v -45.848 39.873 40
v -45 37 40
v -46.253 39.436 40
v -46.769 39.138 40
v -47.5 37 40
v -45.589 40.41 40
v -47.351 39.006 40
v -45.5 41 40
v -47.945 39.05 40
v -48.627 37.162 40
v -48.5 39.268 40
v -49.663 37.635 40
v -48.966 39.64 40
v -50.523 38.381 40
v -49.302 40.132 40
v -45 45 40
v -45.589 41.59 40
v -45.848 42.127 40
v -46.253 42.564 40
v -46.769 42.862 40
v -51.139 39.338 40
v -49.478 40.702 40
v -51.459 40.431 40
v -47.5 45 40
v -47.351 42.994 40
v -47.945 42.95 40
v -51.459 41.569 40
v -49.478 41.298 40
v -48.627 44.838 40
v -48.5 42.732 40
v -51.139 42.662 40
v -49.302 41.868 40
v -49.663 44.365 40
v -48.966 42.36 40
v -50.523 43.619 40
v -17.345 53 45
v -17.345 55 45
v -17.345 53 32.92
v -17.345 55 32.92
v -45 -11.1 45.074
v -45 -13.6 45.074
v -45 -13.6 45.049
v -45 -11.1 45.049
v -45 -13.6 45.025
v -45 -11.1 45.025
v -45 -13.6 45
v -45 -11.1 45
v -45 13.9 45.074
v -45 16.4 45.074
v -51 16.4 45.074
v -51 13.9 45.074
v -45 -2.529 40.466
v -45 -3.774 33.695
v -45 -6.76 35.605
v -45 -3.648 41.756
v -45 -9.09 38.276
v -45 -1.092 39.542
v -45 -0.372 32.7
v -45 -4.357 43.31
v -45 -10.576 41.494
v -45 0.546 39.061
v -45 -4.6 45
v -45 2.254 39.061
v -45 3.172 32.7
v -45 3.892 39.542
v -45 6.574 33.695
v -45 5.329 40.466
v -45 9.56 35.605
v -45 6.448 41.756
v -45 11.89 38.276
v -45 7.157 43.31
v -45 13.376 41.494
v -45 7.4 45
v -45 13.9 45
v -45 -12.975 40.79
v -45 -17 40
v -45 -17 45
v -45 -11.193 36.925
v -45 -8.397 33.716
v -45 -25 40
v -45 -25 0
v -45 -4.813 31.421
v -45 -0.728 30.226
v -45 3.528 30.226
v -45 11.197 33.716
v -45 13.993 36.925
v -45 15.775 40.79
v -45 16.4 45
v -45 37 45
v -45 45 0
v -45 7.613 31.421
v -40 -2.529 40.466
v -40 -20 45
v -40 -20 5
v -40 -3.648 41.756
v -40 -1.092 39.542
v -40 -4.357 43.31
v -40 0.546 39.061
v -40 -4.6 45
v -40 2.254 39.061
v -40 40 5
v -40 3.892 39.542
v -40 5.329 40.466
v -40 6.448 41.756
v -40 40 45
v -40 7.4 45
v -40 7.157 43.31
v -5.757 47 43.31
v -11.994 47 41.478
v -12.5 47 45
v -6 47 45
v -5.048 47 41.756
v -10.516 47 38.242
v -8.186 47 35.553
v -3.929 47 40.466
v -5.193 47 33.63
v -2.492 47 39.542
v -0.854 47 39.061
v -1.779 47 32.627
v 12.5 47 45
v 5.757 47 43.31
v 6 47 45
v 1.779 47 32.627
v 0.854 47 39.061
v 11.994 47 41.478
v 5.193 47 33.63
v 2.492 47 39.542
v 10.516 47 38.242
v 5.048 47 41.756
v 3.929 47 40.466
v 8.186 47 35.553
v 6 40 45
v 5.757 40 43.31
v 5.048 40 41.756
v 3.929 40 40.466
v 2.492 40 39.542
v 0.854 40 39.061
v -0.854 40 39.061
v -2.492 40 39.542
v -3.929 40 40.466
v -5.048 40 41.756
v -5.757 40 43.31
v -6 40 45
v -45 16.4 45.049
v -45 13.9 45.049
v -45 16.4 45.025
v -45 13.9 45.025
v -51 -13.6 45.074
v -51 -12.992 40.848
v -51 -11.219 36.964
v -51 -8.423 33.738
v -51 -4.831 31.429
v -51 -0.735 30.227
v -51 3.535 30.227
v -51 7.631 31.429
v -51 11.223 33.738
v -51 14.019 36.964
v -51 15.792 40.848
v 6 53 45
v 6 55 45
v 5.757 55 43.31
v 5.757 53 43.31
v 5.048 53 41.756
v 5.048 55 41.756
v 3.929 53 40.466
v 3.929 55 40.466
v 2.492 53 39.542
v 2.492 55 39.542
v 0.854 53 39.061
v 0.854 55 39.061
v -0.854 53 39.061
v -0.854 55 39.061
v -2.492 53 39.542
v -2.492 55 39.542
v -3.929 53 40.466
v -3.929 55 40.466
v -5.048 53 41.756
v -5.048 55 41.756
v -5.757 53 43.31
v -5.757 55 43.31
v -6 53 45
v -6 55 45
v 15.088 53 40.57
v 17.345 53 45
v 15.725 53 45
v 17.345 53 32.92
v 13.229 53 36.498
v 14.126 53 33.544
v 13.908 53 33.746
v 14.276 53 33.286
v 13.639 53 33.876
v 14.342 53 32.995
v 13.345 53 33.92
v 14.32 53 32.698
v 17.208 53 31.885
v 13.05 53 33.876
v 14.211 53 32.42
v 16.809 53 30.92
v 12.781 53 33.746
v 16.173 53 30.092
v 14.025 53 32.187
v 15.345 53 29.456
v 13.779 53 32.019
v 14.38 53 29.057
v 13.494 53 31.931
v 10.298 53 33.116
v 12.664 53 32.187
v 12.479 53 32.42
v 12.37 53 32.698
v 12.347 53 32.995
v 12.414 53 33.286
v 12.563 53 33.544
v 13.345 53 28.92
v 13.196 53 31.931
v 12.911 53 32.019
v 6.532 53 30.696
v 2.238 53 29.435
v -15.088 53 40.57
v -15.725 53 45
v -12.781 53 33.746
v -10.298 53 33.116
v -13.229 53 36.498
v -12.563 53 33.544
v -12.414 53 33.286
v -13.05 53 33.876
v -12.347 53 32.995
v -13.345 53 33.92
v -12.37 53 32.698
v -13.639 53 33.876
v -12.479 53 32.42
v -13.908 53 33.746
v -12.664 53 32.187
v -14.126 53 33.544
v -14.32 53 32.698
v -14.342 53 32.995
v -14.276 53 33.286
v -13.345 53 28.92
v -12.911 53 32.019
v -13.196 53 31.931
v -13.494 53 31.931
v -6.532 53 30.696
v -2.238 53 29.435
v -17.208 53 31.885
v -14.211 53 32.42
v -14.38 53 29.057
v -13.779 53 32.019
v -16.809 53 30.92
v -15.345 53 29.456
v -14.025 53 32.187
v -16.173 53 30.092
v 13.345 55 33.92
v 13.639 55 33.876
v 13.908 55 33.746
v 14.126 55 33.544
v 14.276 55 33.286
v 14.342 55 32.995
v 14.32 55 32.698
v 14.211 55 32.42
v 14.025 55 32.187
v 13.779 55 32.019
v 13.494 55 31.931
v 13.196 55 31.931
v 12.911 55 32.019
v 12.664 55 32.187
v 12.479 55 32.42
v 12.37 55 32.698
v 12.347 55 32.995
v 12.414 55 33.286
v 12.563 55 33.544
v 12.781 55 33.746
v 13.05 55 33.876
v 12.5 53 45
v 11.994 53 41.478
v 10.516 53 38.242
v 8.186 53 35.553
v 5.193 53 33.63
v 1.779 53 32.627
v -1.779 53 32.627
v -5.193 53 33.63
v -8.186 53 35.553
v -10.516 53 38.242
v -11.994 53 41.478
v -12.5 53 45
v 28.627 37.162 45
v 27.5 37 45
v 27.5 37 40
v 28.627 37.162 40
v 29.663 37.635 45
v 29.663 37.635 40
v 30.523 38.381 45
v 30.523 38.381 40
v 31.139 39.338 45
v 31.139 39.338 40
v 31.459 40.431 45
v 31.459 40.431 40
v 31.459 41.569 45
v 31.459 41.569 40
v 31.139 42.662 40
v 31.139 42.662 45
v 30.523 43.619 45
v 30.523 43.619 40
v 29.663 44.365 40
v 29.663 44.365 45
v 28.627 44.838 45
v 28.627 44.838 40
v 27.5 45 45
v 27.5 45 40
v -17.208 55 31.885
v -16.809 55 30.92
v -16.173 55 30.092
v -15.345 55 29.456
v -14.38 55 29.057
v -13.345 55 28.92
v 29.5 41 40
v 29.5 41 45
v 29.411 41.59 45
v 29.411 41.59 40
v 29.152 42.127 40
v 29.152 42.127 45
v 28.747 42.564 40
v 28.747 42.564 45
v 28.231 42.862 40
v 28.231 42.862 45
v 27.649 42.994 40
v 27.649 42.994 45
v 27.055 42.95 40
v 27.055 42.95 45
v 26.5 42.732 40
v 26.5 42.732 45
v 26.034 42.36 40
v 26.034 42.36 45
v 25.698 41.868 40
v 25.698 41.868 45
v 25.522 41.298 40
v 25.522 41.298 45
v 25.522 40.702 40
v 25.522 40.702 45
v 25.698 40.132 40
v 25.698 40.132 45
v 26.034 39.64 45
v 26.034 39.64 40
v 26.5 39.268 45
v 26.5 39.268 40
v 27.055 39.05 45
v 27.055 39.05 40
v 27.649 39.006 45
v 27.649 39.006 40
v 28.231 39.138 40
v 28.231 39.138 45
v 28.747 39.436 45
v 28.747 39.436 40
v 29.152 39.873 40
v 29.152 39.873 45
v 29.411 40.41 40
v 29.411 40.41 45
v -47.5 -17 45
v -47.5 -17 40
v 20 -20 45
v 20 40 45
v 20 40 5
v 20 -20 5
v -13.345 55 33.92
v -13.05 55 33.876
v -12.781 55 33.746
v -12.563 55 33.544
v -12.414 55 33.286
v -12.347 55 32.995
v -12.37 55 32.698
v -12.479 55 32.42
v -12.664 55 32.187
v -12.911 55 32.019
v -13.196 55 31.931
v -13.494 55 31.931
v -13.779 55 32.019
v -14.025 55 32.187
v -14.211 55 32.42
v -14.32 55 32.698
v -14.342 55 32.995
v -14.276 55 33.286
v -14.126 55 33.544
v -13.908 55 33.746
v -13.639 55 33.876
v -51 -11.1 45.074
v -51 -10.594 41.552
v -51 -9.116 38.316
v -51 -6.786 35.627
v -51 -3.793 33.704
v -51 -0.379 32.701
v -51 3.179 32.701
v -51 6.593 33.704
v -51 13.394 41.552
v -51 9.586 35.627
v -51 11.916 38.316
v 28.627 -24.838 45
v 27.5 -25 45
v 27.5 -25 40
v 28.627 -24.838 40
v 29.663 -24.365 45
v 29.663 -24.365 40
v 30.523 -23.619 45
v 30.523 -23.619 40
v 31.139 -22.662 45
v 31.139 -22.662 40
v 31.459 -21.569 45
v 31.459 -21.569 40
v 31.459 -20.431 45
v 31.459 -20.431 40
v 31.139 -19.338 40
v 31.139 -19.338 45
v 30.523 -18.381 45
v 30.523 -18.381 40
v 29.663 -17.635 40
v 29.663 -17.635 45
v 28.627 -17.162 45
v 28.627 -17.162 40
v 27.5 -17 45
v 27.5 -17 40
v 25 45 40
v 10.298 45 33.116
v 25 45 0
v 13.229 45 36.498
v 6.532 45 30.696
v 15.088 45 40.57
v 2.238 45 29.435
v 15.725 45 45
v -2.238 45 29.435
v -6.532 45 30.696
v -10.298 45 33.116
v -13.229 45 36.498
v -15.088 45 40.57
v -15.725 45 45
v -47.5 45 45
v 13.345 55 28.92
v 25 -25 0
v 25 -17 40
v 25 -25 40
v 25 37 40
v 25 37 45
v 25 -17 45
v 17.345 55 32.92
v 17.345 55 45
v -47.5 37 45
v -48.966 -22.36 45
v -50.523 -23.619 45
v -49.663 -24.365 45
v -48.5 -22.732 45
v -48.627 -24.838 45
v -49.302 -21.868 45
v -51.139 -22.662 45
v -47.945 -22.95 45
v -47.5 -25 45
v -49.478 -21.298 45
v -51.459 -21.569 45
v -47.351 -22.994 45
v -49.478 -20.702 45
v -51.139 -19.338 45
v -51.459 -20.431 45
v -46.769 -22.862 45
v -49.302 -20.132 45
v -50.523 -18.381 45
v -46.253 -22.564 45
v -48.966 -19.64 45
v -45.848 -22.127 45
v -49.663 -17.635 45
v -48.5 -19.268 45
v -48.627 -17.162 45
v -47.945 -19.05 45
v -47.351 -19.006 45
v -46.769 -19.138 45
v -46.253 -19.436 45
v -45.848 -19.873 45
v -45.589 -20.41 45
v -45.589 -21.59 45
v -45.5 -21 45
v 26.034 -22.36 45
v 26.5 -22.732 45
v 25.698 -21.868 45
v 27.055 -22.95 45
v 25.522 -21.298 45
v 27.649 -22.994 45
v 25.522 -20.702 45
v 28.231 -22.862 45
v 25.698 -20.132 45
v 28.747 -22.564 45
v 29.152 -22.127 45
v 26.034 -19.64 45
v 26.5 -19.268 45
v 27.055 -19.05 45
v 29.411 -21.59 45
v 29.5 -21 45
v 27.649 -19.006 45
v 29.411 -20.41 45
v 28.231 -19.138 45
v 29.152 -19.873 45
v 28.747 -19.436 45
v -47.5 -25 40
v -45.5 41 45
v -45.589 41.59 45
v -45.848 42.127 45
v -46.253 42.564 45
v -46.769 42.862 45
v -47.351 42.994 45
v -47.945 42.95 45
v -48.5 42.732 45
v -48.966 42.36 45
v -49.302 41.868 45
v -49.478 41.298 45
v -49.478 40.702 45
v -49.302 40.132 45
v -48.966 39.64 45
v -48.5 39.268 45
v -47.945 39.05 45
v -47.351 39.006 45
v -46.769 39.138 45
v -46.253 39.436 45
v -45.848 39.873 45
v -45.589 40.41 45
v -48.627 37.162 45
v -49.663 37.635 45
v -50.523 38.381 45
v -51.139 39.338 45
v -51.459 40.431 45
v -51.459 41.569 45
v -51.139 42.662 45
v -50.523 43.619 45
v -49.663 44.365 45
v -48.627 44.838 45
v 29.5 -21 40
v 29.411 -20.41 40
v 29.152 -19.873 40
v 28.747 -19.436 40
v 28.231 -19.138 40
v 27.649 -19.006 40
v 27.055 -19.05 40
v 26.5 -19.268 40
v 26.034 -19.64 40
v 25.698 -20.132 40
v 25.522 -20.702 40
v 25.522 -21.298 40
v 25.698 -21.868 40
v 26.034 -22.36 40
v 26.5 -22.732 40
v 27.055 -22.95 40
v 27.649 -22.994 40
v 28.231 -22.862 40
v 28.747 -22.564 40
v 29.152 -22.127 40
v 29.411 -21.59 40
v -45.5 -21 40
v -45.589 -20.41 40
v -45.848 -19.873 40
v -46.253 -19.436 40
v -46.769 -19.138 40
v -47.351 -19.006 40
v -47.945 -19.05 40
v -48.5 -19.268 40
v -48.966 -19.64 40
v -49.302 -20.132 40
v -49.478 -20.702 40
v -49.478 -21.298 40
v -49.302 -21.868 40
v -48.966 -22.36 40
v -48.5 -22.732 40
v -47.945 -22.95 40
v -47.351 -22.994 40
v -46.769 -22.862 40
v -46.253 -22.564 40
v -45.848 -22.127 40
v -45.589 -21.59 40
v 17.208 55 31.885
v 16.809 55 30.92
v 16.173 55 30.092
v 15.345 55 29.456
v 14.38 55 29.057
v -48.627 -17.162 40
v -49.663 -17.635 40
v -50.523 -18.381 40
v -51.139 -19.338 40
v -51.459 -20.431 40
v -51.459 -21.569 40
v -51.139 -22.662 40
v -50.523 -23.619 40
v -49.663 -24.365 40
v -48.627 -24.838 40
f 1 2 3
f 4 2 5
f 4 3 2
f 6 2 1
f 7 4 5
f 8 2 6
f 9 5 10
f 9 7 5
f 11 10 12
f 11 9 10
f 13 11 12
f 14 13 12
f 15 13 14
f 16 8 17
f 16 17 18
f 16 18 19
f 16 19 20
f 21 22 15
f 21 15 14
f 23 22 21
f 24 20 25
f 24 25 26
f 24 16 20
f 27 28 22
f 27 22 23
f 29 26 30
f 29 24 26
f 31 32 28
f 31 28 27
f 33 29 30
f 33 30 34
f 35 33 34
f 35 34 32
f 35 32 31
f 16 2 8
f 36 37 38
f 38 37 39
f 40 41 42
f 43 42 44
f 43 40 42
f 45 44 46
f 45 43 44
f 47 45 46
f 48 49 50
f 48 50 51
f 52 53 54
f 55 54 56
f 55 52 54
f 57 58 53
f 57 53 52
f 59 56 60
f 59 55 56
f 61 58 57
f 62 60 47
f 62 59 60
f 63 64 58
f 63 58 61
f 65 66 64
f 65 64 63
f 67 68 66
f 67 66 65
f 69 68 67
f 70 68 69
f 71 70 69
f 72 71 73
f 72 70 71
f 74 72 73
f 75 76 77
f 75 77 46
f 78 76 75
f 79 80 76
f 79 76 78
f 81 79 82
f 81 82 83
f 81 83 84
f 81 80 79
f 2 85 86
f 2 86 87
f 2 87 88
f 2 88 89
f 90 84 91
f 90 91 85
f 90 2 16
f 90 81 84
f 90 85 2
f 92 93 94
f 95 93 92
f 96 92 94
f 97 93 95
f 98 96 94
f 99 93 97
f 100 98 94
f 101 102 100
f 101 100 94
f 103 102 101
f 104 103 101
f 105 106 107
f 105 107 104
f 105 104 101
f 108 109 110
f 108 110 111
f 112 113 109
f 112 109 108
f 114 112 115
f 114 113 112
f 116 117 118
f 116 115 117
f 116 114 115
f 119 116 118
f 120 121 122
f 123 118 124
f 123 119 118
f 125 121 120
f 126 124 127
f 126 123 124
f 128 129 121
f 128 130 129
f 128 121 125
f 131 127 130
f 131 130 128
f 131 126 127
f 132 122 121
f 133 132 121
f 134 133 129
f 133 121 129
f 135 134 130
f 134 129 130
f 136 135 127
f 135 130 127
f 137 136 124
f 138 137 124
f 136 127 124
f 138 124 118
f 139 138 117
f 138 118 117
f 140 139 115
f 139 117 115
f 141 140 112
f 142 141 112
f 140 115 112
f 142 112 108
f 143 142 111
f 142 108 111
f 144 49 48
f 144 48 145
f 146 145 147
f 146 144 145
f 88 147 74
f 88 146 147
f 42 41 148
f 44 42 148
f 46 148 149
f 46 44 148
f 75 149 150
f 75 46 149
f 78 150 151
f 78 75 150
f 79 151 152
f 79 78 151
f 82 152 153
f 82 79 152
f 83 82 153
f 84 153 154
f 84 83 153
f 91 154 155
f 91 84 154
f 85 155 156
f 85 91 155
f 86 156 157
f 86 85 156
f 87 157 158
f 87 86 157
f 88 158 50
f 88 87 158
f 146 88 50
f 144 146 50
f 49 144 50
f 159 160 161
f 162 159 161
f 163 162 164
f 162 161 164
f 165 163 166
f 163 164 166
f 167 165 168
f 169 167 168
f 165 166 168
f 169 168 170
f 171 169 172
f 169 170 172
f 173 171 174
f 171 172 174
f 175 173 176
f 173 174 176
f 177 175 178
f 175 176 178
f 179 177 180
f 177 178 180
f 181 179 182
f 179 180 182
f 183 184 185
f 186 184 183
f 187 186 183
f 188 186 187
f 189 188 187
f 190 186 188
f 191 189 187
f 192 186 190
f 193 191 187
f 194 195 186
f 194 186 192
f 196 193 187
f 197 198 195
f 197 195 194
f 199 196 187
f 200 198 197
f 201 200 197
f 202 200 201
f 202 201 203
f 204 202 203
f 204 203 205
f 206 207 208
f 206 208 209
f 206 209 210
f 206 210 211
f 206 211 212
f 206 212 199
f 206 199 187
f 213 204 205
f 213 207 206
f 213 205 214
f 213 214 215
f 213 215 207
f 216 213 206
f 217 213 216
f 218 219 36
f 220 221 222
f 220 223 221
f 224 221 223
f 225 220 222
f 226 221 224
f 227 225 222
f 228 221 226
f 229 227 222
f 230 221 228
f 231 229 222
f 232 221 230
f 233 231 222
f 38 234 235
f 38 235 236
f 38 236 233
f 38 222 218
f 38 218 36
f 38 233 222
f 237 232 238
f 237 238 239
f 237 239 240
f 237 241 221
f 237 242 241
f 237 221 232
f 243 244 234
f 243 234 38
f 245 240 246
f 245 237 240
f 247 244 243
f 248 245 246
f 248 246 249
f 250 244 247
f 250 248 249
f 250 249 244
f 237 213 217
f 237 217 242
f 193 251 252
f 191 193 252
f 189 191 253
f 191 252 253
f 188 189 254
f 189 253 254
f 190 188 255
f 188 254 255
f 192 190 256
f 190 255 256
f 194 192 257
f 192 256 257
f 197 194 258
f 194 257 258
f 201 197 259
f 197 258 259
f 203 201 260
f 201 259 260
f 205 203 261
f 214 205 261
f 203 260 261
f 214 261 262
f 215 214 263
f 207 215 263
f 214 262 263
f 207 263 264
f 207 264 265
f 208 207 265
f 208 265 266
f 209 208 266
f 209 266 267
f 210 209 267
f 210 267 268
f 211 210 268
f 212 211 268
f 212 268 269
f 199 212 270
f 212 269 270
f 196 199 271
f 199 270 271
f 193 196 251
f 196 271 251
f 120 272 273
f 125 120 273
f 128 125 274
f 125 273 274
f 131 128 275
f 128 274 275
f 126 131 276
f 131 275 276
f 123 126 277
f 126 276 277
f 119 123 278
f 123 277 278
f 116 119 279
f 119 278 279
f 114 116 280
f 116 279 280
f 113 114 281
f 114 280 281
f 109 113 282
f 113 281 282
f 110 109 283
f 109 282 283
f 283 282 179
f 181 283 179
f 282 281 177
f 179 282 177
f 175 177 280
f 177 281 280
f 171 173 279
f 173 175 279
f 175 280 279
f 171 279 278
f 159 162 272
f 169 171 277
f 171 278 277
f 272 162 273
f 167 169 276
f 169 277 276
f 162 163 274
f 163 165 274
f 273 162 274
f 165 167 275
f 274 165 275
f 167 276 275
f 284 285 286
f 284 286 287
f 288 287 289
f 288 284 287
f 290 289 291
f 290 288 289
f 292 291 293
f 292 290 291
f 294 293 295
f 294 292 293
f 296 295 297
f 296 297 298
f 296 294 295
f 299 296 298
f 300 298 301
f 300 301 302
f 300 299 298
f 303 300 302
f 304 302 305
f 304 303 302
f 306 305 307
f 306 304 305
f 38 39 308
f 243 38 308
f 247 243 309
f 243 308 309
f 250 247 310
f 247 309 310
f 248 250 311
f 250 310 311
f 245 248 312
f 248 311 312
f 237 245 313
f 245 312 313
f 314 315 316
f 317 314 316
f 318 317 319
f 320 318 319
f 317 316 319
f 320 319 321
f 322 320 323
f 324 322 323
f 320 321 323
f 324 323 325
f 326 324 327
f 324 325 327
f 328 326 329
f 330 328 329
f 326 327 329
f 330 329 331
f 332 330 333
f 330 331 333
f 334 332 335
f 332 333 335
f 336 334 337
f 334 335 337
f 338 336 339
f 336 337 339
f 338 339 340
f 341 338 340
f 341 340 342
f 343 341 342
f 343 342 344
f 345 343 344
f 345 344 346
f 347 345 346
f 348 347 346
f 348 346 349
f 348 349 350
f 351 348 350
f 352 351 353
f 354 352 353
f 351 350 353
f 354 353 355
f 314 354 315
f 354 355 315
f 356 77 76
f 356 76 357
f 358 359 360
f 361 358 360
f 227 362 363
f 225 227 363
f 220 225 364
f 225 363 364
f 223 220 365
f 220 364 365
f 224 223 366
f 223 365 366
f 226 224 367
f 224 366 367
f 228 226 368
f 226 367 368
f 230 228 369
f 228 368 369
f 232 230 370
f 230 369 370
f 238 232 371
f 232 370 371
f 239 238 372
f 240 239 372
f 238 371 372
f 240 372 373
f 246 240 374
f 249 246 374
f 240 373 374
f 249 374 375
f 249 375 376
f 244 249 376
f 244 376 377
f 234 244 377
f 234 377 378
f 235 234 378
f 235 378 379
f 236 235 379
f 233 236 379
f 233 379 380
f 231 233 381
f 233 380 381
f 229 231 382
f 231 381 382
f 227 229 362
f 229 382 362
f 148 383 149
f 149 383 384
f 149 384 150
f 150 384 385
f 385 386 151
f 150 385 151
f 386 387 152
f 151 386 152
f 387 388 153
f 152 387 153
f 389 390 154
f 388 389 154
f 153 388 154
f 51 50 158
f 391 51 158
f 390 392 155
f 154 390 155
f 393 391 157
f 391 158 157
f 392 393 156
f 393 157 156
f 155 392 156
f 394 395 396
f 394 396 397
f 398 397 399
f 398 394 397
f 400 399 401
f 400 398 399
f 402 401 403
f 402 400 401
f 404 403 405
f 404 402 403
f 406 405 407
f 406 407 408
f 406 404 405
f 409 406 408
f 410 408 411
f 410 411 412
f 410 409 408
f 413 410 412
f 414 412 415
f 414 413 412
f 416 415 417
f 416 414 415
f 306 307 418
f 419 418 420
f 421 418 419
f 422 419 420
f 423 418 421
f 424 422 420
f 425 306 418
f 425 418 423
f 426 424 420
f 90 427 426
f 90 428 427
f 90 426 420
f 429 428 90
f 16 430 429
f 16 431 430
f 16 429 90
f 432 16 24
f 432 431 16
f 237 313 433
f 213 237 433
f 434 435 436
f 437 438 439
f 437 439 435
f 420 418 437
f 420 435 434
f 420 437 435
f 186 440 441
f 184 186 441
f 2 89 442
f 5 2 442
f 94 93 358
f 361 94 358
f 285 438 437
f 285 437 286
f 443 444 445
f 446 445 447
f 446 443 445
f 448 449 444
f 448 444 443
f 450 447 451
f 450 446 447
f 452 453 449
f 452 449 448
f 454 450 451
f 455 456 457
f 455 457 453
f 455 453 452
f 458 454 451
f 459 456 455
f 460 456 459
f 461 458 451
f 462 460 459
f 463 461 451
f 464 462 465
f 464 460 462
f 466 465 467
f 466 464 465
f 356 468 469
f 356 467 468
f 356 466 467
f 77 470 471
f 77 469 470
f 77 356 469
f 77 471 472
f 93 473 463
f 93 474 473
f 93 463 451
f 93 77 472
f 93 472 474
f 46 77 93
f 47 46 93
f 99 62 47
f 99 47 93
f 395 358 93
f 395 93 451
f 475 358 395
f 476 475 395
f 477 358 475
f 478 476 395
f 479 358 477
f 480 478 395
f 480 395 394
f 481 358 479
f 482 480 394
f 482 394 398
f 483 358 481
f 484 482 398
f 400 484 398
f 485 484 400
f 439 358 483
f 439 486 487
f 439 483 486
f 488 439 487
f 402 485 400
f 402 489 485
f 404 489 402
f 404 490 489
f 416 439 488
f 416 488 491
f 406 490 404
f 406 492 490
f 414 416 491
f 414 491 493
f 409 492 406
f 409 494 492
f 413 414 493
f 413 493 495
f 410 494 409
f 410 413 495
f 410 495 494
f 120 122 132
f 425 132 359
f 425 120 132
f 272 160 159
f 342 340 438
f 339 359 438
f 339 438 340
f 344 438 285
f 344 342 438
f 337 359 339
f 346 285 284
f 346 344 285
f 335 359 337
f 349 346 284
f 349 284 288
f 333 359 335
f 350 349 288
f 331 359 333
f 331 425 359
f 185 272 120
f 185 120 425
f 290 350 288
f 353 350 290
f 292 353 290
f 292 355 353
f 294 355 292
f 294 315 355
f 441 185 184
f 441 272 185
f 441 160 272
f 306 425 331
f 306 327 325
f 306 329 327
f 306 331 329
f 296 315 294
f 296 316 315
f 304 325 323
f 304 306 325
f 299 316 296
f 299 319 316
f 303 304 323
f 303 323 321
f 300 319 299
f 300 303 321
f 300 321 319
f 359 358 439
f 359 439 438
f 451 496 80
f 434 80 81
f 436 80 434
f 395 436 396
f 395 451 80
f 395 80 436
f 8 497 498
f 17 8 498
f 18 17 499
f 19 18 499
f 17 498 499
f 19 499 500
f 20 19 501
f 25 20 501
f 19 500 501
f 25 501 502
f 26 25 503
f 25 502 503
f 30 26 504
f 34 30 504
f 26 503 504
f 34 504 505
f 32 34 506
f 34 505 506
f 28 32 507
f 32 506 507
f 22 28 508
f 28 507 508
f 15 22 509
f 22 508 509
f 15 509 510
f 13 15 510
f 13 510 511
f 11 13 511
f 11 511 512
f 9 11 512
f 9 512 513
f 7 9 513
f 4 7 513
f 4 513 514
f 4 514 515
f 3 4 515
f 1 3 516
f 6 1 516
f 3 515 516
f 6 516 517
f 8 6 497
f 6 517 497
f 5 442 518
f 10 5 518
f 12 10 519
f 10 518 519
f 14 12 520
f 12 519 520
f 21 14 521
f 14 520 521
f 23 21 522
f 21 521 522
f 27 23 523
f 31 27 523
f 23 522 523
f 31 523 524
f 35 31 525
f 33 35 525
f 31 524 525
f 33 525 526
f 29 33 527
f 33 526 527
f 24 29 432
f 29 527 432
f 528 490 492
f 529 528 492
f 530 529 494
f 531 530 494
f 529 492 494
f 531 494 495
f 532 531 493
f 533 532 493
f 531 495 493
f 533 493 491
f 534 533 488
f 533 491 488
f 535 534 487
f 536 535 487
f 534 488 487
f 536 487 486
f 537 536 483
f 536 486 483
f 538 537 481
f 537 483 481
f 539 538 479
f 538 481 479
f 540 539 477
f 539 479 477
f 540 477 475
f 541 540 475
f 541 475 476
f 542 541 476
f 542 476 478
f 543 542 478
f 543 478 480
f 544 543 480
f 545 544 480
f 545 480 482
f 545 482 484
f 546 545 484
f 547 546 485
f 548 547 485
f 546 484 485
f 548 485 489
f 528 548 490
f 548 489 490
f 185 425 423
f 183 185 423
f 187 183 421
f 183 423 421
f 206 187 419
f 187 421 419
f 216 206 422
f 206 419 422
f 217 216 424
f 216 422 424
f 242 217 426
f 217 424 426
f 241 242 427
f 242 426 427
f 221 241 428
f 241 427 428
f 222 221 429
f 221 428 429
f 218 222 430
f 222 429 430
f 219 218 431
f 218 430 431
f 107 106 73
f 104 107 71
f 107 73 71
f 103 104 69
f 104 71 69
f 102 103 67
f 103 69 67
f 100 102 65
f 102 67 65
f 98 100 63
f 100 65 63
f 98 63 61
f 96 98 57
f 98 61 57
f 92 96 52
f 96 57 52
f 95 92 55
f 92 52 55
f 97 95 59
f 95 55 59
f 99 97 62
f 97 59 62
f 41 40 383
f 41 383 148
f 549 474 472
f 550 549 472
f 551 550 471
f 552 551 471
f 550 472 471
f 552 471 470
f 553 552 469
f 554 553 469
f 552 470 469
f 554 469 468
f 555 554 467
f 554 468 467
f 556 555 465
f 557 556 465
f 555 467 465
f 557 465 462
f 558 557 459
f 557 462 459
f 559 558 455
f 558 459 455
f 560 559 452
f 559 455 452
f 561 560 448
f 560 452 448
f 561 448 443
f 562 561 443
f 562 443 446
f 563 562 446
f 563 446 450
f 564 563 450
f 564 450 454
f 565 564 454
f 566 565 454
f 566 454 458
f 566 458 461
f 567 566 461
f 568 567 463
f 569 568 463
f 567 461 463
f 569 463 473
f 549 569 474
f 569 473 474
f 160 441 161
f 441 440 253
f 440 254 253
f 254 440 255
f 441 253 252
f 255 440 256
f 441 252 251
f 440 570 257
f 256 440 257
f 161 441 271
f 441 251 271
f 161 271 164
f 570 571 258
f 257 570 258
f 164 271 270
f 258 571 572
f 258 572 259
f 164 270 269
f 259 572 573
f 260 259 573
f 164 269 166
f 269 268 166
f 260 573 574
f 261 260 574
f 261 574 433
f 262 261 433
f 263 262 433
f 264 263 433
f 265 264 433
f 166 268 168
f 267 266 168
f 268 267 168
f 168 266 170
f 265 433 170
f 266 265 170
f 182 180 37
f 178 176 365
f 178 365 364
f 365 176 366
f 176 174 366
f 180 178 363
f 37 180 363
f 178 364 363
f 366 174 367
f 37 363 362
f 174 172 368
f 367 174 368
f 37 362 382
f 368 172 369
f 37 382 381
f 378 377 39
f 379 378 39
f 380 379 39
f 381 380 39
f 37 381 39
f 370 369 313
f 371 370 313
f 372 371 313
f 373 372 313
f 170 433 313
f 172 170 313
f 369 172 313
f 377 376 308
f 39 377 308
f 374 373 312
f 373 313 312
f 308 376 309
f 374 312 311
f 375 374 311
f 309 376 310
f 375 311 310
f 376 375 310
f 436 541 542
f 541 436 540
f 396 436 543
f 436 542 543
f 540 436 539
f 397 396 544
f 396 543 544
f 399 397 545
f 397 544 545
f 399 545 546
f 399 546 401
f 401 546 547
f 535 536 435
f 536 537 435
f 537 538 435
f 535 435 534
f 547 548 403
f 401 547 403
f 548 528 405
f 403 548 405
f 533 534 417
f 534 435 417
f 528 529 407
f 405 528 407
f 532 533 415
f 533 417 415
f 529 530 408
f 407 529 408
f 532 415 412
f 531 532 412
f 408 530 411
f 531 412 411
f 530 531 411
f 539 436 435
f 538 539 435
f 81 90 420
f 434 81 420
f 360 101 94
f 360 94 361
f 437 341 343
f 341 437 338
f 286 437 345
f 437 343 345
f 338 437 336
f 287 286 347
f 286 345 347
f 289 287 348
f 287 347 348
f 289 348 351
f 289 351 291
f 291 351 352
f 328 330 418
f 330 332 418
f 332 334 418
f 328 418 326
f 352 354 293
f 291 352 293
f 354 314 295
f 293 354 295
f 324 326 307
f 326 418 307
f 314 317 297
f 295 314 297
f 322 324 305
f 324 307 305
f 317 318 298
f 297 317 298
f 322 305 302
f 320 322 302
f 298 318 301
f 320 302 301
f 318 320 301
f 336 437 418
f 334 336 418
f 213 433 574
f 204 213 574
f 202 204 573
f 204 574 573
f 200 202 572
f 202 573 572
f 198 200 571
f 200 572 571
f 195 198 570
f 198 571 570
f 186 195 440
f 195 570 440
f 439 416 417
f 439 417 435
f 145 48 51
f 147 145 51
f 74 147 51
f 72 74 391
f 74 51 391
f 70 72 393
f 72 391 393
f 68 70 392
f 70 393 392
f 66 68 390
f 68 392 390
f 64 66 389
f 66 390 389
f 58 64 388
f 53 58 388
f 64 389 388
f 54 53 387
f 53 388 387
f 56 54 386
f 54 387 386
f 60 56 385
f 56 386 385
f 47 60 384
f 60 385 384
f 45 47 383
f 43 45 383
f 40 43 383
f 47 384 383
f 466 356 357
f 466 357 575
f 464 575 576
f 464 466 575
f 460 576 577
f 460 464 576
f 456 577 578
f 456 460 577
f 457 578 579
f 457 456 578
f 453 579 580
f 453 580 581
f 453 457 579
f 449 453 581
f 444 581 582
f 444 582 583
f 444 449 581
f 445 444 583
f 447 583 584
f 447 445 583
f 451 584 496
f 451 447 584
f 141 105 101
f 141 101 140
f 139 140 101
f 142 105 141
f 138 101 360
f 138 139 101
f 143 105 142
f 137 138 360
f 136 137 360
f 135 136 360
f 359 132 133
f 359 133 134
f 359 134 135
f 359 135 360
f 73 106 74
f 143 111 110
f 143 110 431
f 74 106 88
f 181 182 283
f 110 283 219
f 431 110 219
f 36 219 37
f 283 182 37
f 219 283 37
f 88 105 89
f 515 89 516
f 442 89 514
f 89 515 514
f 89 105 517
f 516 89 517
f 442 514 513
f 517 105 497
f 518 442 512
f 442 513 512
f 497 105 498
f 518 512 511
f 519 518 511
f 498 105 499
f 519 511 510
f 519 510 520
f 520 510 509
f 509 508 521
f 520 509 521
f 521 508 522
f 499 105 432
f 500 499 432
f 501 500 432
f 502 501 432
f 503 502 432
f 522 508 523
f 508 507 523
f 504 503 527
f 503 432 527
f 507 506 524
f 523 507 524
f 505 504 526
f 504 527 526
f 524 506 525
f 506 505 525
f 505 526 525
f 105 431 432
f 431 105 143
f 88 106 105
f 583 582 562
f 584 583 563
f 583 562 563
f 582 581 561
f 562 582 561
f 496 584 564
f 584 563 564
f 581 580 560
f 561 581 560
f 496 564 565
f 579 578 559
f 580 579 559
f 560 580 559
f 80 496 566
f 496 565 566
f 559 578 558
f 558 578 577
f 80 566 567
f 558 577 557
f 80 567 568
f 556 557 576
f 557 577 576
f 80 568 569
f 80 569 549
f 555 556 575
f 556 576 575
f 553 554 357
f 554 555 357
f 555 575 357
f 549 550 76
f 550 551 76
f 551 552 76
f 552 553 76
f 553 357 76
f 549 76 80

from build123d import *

# Parameters (mm, degrees)
SKETCH_1_W               = 90
SKETCH_1_H               = 90
EXTRUDE_2_DEPTH          = 45
SKETCH_2_W               = 80
SKETCH_2_H               = 80
CUT_EXTRUDE_1_DEPTH      = 40
EXTRUDE_3_DEPTH          = 10
SKETCH_4_R               = 1
EXTRUDE_4_DEPTH          = 2
SKETCH_5_R               = 6
CUT_EXTRUDE_2_DEPTH      = 30
EXTRUDE_5_DEPTH          = 6
CUT_EXTRUDE_START        = -2
CUT_EXTRUDE_3_DEPTH      = 6
SKETCH_8_R               = 12.5
CUT_EXTRUDE_4_DEPTH      = 6
SKETCH_9_R               = 6
CUT_EXTRUDE_5_DEPTH      = 6
SKETCH_10_R              = 2
EXTRUDE_6_DEPTH          = 5
CUT_EXTRUDE_6_DEPTH      = 86.341501801
CUT_EXTRUDE_6_DEPTH_BACK = 86.341501801
EXTRUDE_8_DEPTH          = 5
EXTRUDE_9_REACH          = 89.762
SKETCH_13_W              = 70
SKETCH_13_H              = 5
SKETCH_14_R              = 2
SKETCH_14_W              = 3.535716984
SKETCH_14_H              = 8
EXTRUDE_10_DEPTH         = 5


with BuildPart() as part:
    # 草图1 → 凸台-拉伸2 (new body)
    with BuildSketch(Plane.XY):
        Rectangle(SKETCH_1_W, SKETCH_1_H)
    extrude(amount=EXTRUDE_2_DEPTH)

    # 草图2 → 切除-拉伸1 (cut)
    with BuildSketch(Plane.XY.offset(45)):
        Rectangle(SKETCH_2_W, SKETCH_2_H)
    extrude(amount=-CUT_EXTRUDE_1_DEPTH, mode=Mode.SUBTRACT)

    # 草图3 → 凸台-拉伸3 (add)
    with BuildSketch(Plane(origin=(0, 45, 0), x_dir=(1, 0, 0), z_dir=(0, 1, 0))):
        with BuildLine():
            Line((-15.725, -45), (15.725, -45))
            ThreePointArc((15.725, -45), (0, -29.275), (-15.725, -45))
        make_face()
    extrude(amount=EXTRUDE_3_DEPTH)

    # 草图4 → 凸台-拉伸4 (add)
    with BuildSketch(Plane(origin=(0, 55, 0), x_dir=(1, 0, 0), z_dir=(0, 1, 0))):
        with BuildLine():
            Line((-13.344644505, -28.920245738), (13.344644505, -28.920245738))
            ThreePointArc((13.344644505, -28.920245738), (16.17307163, -30.091818614), (17.344644505, -32.920245738))
            Line((17.344644505, -32.920245738), (17.344644505, -45))
            Line((17.344644505, -45), (-17.344644505, -45))
            Line((-17.344644505, -45), (-17.344644505, -32.920245738))
            ThreePointArc((-17.344644505, -32.920245738), (-16.17307163, -30.091818614), (-13.344644505, -28.920245738))
        make_face()
        with Locations(Location((13.344644505, -32.920245738, 0), (0, 0, 270))):
            Circle(SKETCH_4_R, mode=Mode.SUBTRACT)
        with Locations(Location((-13.344644505, -32.920245738, 0), (0, 0, 270))):
            Circle(SKETCH_4_R, mode=Mode.SUBTRACT)
    extrude(amount=-EXTRUDE_4_DEPTH)

    # 草图5 → 切除-拉伸2 (cut)
    with BuildSketch(Plane(origin=(0, 55, 0), x_dir=(1, 0, 0), z_dir=(0, 1, 0))):
        with Locations((0, -45)):
            Circle(SKETCH_5_R)
    extrude(amount=-CUT_EXTRUDE_2_DEPTH, mode=Mode.SUBTRACT)

    # 草图6 → 凸台-拉伸5 (add)
    with BuildSketch(Plane.ZY.offset(45)):
        with BuildLine():
            Line((45.073955752, 16.4), (45.073955752, -13.6))
            ThreePointArc((45.073955752, -13.6), (30.073955752, 1.4), (45.073955752, 16.4))
        make_face()
    extrude(amount=EXTRUDE_5_DEPTH)

    # 草图7 → 切除-拉伸3 (cut)
    with BuildSketch(Plane(origin=(0, 55, 0), x_dir=(1, 0, 0), z_dir=(0, 1, 0)).offset(CUT_EXTRUDE_START)):
        with BuildLine():
            Line((-12.5, -45), (12.5, -45))
            ThreePointArc((12.5, -45), (0, -32.5), (-12.5, -45))
        make_face()
    extrude(amount=-CUT_EXTRUDE_3_DEPTH, mode=Mode.SUBTRACT)

    # 草图8 → 切除-拉伸4 (cut)
    with BuildSketch(Plane.ZY.offset(51)):
        with Locations((45.073955752, 1.4)):
            Circle(SKETCH_8_R)
    extrude(amount=-CUT_EXTRUDE_4_DEPTH, mode=Mode.SUBTRACT)

    # 草图9 → 切除-拉伸5 (cut)
    with BuildSketch(Plane.ZY.offset(45)):
        with Locations((45, 1.4)):
            Circle(SKETCH_9_R)
    extrude(amount=-CUT_EXTRUDE_5_DEPTH, mode=Mode.SUBTRACT)

    # 草图10 → 凸台-拉伸6 (add)
    # profile 1 of 4: a face of its own
    with BuildSketch(Plane.XY.offset(45)):
        with BuildLine():
            Line((-47.5, 45), (-42.902808048, 45))
            Line((-42.902808048, 45), (-42.902808048, 37))
            Line((-42.902808048, 37), (-47.5, 37))
            ThreePointArc((-47.5, 37), (-51.5, 41), (-47.5, 45))
        make_face()
        with Locations((-47.5, 41)):
            Circle(SKETCH_10_R, mode=Mode.SUBTRACT)
    # profile 2 of 4: a face of its own
    with BuildSketch(Plane.XY.offset(45)):
        with BuildLine():
            Line((-47.5, -45), (-42.902808048, -45))
            Line((-42.902808048, -45), (-42.902808048, -37))
            Line((-42.902808048, -37), (-47.5, -37))
            ThreePointArc((-47.5, -37), (-51.5, -41), (-47.5, -45))
        make_face()
        with Locations((-47.5, -41)):
            Circle(SKETCH_10_R, mode=Mode.SUBTRACT)
    # profile 3 of 4: a face of its own
    with BuildSketch(Plane.XY.offset(45)):
        with BuildLine():
            Line((42.460881889, 45), (42.460881889, 37))
            Line((42.460881889, 37), (47.5, 37))
            ThreePointArc((47.5, 37), (51.5, 41), (47.5, 45))
            Line((47.5, 45), (42.460881889, 45))
        make_face()
        with Locations((47.5, 41)):
            Circle(SKETCH_10_R, mode=Mode.SUBTRACT)
    # profile 4 of 4: a face of its own
    with BuildSketch(Plane.XY.offset(45)):
        with BuildLine():
            Line((41.065096799, -37), (41.065096799, -45))
            Line((41.065096799, -45), (47.5, -45))
            ThreePointArc((47.5, -45), (51.5, -41), (47.5, -37))
            Line((47.5, -37), (41.065096799, -37))
        make_face()
        with Locations((47.5, -41)):
            Circle(SKETCH_10_R, mode=Mode.SUBTRACT)
    extrude(amount=-EXTRUDE_6_DEPTH)

    # 草图11 → 切除-拉伸6 (cut, two sides: drawn at the far end of the back side and taken through both)
    with BuildSketch(Plane.XY.offset(5).offset(-CUT_EXTRUDE_6_DEPTH_BACK)):
        Polygon((25, 25), (25, 60.762211799), (85.89289348, 60.762211799), (85.89289348, -73.939659246), (-86.710921037, -73.939659246), (-86.710921037, -25), (-25, -25), (25, -25), align=None)
    extrude(amount=CUT_EXTRUDE_6_DEPTH + CUT_EXTRUDE_6_DEPTH_BACK, mode=Mode.SUBTRACT)

    # 草图12 → 凸台-拉伸8 (add)
    with BuildSketch(Plane(origin=(25, 0, 0), x_dir=(0, 0, -1), z_dir=(1, 0, 0))):
        Polygon((-45, 40), (-45, -25), (-5, -25), (0, -25), (0, 45), (-45, 45), align=None)
    extrude(amount=-EXTRUDE_8_DEPTH)

    # 草图13 → 凸台-拉伸9 (add, up to next)
    with BuildSketch(Plane.XY.offset(45), mode=Mode.PRIVATE) as extrude_9_sk1:
        with Locations((-10, -22.5)):
            Rectangle(SKETCH_13_W, SKETCH_13_H)
    extrude_9_tool1 = extrude(extrude_9_sk1.sketch, amount=-EXTRUDE_9_REACH, mode=Mode.PRIVATE) - part.part
    add(extrude_9_tool1.solids().sort_by_distance((-10, -22.5, 45))[0])

    # 草图14 → 凸台-拉伸10 (add)
    # profile 1 of 5: a face of its own
    with BuildSketch(Plane.XY.offset(45)):
        with BuildLine():
            Line((27.5, 45), (25, 45))
            Line((25, 45), (25, 37))
            Line((25, 37), (27.5, 37))
            ThreePointArc((27.5, 37), (31.5, 41), (27.5, 45))
        make_face()
        with Locations((27.5, 41)):
            Circle(SKETCH_14_R, mode=Mode.SUBTRACT)
    # profile 2 of 5: a face of its own
    with BuildSketch(Plane.XY.offset(45)):
        with Locations((-43.232141508, -21)):
            Rectangle(SKETCH_14_W, SKETCH_14_H)
    # profile 3 of 5: a face of its own
    with BuildSketch(Plane.XY.offset(45)):
        with Locations((23.232141508, -21)):
            Rectangle(SKETCH_14_W, SKETCH_14_H)
    # profile 4 of 5: a face of its own
    with BuildSketch(Plane.XY.offset(45)):
        with BuildLine():
            Line((27.5, -17), (25, -17))
            Line((25, -17), (25, -25))
            Line((25, -25), (27.5, -25))
            ThreePointArc((27.5, -25), (31.5, -21), (27.5, -17))
        make_face()
        with Locations((27.5, -21)):
            Circle(SKETCH_14_R, mode=Mode.SUBTRACT)
    # profile 5 of 5: a face of its own
    with BuildSketch(Plane.XY.offset(45)):
        with BuildLine():
            Line((-47.5, -25), (-45, -25))
            Line((-45, -25), (-45, -17))
            Line((-45, -17), (-47.5, -17))
            ThreePointArc((-47.5, -17), (-51.5, -21), (-47.5, -25))
        make_face()
        with Locations((-47.5, -21)):
            Circle(SKETCH_14_R, mode=Mode.SUBTRACT)
    extrude(amount=-EXTRUDE_10_DEPTH)


solid = part.part
